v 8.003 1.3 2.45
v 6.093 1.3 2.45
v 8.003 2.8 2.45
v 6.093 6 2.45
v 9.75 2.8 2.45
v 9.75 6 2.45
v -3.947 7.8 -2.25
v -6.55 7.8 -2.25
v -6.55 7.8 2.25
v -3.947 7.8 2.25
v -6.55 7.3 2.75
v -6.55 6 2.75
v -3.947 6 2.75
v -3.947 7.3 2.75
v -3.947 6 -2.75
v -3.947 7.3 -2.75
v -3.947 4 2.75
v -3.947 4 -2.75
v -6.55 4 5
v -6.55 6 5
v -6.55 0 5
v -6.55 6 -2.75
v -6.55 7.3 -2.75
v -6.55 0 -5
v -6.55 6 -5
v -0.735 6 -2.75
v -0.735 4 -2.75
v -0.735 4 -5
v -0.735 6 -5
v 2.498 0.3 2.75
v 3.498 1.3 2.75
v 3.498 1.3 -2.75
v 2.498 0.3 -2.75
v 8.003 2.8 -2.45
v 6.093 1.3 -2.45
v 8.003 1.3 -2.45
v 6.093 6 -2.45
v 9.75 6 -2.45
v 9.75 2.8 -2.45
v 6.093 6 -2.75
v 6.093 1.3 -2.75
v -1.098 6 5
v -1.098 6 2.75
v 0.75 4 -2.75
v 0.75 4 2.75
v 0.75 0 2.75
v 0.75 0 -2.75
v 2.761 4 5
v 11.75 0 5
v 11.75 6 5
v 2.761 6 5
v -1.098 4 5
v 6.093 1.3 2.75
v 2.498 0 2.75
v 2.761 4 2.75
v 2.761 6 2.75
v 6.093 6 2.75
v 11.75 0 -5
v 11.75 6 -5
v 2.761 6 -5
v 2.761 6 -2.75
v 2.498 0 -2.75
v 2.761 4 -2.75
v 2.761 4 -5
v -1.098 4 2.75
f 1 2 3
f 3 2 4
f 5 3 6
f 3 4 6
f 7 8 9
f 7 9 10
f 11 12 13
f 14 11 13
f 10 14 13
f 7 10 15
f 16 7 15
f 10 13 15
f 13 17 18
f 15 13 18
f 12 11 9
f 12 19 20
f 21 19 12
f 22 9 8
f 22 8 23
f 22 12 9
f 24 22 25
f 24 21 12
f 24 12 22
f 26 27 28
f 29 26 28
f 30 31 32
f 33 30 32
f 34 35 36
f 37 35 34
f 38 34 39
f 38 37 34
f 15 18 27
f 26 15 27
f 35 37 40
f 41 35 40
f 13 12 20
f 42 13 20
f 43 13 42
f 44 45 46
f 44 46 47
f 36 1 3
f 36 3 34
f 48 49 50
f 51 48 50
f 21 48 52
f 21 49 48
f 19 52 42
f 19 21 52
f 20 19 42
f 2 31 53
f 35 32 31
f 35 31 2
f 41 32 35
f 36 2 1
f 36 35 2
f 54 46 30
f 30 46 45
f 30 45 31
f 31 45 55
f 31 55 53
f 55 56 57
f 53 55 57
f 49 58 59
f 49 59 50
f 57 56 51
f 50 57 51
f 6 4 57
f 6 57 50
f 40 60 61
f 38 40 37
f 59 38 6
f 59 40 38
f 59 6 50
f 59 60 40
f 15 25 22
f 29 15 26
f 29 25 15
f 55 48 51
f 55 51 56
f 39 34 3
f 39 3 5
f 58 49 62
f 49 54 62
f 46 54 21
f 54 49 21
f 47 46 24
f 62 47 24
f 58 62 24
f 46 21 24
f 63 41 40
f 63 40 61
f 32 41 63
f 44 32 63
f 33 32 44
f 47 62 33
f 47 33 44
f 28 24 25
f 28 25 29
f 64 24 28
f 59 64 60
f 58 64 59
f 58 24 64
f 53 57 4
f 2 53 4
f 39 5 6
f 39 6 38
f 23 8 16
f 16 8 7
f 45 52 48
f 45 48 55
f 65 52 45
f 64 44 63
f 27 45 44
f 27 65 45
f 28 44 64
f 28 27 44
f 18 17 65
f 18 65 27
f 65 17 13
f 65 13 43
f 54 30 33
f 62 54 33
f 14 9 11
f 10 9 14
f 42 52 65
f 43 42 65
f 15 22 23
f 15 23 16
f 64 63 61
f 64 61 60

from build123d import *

# Parameters (mm, degrees)
SKETCH1_W           = 19.5
SKETCH1_H           = 10
BOSS_EXTRUDE1_DEPTH = 4
SKETCH2_W           = 9
SKETCH2_H           = 5.5
CUT_EXTRUDE1_DEPTH  = 2.7
SKETCH3_W           = 3.2
SKETCH3_H           = 3.9
CUT_EXTRUDE2_DEPTH  = 12.664583147
SKETCH4_W           = 1.747901038
SKETCH4_H           = 5.5
CUT_EXTRUDE3_DEPTH  = 12.285056491
CHAMFER2_SIZE       = 1
SKETCH5_W           = 10
SKETCH5_H           = 4
BOSS_EXTRUDE2_DEPTH = 2
SKETCH6_W           = 1.747077863
SKETCH6_H           = 5.5
BOSS_EXTRUDE3_DEPTH = 1.5
BOSS_EXTRUDE4_DEPTH = 2
BOSS_EXTRUDE5_REACH = 16.109
SKETCH9_W           = 3.657403566
SKETCH9_H           = 0.3
SKETCH10_W          = 5.81497097
SKETCH10_H          = 2.25
SKETCH10_W_2        = 5.452409629
BOSS_EXTRUDE6_DEPTH = 2
SKETCH11_W          = 2.603359148
SKETCH11_H          = 5.5
BOSS_EXTRUDE7_DEPTH = 3.8
CHAMFER3_SIZE       = 0.5
SKETCH12_W          = 10
SKETCH12_H          = 6
CUT_EXTRUDE4_DEPTH  = 3.8


with BuildPart() as part:
    # Sketch1 → Boss-Extrude1 (new body)
    with BuildSketch(Plane(origin=(0, 0, 0), x_dir=(1, 0, 0), z_dir=(0, 1, 0))):
        Rectangle(SKETCH1_W, SKETCH1_H)
    extrude(amount=BOSS_EXTRUDE1_DEPTH)

    # Sketch2 → Cut-Extrude1 (cut)
    with BuildSketch(Plane(origin=(0, 4, 0), x_dir=(1, 0, 0), z_dir=(0, 1, 0))):
        with Locations((5.25, 0)):
            Rectangle(SKETCH2_W, SKETCH2_H)
    extrude(amount=-CUT_EXTRUDE1_DEPTH, mode=Mode.SUBTRACT)

    # Sketch3 → Cut-Extrude2 (cut, through all)
    with BuildSketch(Plane(origin=(0, 4, 0), x_dir=(1, 0, 0), z_dir=(0, 1, 0))):
        with Locations((-8.15, 3.05)):
            Rectangle(SKETCH3_W, SKETCH3_H)
        with Locations((-8.15, -3.05)):
            Rectangle(SKETCH3_W, SKETCH3_H)
    extrude(amount=-CUT_EXTRUDE2_DEPTH, mode=Mode.SUBTRACT)

    # Sketch4 → Cut-Extrude3 (cut, through all)
    with BuildSketch(Plane(origin=(0, 1.3, 0), x_dir=(1, 0, 0), z_dir=(0, 1, 0))):
        with Locations((1.623950519, 0)):
            Rectangle(SKETCH4_W, SKETCH4_H)
    extrude(amount=-CUT_EXTRUDE3_DEPTH, mode=Mode.SUBTRACT)

    # Chamfer2
    chamfer2_edges = [part.edges().sort_by_distance(p)[0] for p in [
        (2.497901038, 1.3, 0),
    ]]
    chamfer(chamfer2_edges, length=CHAMFER2_SIZE)

    # Sketch5 → Boss-Extrude2 (add)
    with BuildSketch(Plane(origin=(9.75, 0, 0), x_dir=(0, 0, -1), z_dir=(1, 0, 0))):
        with Locations((0, 2)):
            Rectangle(SKETCH5_W, SKETCH5_H)
    extrude(amount=BOSS_EXTRUDE2_DEPTH)

    # Sketch6 → Boss-Extrude3 (add)
    with BuildSketch(Plane(origin=(0, 1.3, 0), x_dir=(1, 0, 0), z_dir=(0, 1, 0))):
        with Locations((8.876461068, 0)):
            Rectangle(SKETCH6_W, SKETCH6_H)
    extrude(amount=BOSS_EXTRUDE3_DEPTH)

    # Sketch7 → Boss-Extrude4 (add)
    with BuildSketch(Plane(origin=(0, 4, 0), x_dir=(1, 0, 0), z_dir=(0, 1, 0))):
        Polygon((2.760699465, 2.75), (2.760699465, 5), (11.75, 5), (11.75, -5), (2.760699465, -5), (2.760699465, -2.75), (9.75, -2.75), (9.75, 2.75), align=None)
    extrude(amount=BOSS_EXTRUDE4_DEPTH)

    # Sketch9 → Boss-Extrude5 (add, up to next)
    with BuildSketch(Plane(origin=(0, 6, 0), x_dir=(1, 0, 0), z_dir=(0, 1, 0)), mode=Mode.PRIVATE) as boss_extrude5_sk1:
        with Locations((7.921298217, 2.6)):
            Rectangle(SKETCH9_W, SKETCH9_H)
    boss_extrude5_tool1 = extrude(boss_extrude5_sk1.sketch, amount=-BOSS_EXTRUDE5_REACH, mode=Mode.PRIVATE) - part.part
    # Sketch9 → Boss-Extrude5 (add, up to next)
    with BuildSketch(Plane(origin=(0, 6, 0), x_dir=(1, 0, 0), z_dir=(0, 1, 0)), mode=Mode.PRIVATE) as boss_extrude5_sk2:
        with Locations((7.921298217, -2.6)):
            Rectangle(SKETCH9_W, SKETCH9_H)
    boss_extrude5_tool2 = extrude(boss_extrude5_sk2.sketch, amount=-BOSS_EXTRUDE5_REACH, mode=Mode.PRIVATE) - part.part
    add(boss_extrude5_tool1.solids().sort_by_distance((7.921298, 6, -2.6))[0])
    add(boss_extrude5_tool2.solids().sort_by_distance((7.921298, 6, 2.6))[0])

    # Sketch10 → Boss-Extrude6 (add)
    with BuildSketch(Plane(origin=(0, 4, 0), x_dir=(1, 0, 0), z_dir=(0, 1, 0))):
        with Locations((-3.642514515, 3.875)):
            Rectangle(SKETCH10_W, SKETCH10_H)
        with Locations((-3.823795186, -3.875)):
            Rectangle(SKETCH10_W_2, SKETCH10_H)
    extrude(amount=BOSS_EXTRUDE6_DEPTH)

    # Sketch11 → Boss-Extrude7 (add)
    with BuildSketch(Plane(origin=(0, 4, 0), x_dir=(1, 0, 0), z_dir=(0, 1, 0))):
        with Locations((-5.248320426, 0)):
            Rectangle(SKETCH11_W, SKETCH11_H)
    extrude(amount=BOSS_EXTRUDE7_DEPTH)

    # Chamfer3
    chamfer3_edges = [part.edges().sort_by_distance(p)[0] for p in [
        (-5.248320426, 7.8, 2.75),
        (-5.248320426, 7.8, -2.75),
    ]]
    chamfer(chamfer3_edges, length=CHAMFER3_SIZE)

    # Sketch12 → Cut-Extrude4 (cut)
    with BuildSketch(Plane.ZY.offset(6.55)):
        with Locations((0, 3)):
            Rectangle(SKETCH12_W, SKETCH12_H)
    extrude(amount=CUT_EXTRUDE4_DEPTH, mode=Mode.SUBTRACT)


solid = part.part
